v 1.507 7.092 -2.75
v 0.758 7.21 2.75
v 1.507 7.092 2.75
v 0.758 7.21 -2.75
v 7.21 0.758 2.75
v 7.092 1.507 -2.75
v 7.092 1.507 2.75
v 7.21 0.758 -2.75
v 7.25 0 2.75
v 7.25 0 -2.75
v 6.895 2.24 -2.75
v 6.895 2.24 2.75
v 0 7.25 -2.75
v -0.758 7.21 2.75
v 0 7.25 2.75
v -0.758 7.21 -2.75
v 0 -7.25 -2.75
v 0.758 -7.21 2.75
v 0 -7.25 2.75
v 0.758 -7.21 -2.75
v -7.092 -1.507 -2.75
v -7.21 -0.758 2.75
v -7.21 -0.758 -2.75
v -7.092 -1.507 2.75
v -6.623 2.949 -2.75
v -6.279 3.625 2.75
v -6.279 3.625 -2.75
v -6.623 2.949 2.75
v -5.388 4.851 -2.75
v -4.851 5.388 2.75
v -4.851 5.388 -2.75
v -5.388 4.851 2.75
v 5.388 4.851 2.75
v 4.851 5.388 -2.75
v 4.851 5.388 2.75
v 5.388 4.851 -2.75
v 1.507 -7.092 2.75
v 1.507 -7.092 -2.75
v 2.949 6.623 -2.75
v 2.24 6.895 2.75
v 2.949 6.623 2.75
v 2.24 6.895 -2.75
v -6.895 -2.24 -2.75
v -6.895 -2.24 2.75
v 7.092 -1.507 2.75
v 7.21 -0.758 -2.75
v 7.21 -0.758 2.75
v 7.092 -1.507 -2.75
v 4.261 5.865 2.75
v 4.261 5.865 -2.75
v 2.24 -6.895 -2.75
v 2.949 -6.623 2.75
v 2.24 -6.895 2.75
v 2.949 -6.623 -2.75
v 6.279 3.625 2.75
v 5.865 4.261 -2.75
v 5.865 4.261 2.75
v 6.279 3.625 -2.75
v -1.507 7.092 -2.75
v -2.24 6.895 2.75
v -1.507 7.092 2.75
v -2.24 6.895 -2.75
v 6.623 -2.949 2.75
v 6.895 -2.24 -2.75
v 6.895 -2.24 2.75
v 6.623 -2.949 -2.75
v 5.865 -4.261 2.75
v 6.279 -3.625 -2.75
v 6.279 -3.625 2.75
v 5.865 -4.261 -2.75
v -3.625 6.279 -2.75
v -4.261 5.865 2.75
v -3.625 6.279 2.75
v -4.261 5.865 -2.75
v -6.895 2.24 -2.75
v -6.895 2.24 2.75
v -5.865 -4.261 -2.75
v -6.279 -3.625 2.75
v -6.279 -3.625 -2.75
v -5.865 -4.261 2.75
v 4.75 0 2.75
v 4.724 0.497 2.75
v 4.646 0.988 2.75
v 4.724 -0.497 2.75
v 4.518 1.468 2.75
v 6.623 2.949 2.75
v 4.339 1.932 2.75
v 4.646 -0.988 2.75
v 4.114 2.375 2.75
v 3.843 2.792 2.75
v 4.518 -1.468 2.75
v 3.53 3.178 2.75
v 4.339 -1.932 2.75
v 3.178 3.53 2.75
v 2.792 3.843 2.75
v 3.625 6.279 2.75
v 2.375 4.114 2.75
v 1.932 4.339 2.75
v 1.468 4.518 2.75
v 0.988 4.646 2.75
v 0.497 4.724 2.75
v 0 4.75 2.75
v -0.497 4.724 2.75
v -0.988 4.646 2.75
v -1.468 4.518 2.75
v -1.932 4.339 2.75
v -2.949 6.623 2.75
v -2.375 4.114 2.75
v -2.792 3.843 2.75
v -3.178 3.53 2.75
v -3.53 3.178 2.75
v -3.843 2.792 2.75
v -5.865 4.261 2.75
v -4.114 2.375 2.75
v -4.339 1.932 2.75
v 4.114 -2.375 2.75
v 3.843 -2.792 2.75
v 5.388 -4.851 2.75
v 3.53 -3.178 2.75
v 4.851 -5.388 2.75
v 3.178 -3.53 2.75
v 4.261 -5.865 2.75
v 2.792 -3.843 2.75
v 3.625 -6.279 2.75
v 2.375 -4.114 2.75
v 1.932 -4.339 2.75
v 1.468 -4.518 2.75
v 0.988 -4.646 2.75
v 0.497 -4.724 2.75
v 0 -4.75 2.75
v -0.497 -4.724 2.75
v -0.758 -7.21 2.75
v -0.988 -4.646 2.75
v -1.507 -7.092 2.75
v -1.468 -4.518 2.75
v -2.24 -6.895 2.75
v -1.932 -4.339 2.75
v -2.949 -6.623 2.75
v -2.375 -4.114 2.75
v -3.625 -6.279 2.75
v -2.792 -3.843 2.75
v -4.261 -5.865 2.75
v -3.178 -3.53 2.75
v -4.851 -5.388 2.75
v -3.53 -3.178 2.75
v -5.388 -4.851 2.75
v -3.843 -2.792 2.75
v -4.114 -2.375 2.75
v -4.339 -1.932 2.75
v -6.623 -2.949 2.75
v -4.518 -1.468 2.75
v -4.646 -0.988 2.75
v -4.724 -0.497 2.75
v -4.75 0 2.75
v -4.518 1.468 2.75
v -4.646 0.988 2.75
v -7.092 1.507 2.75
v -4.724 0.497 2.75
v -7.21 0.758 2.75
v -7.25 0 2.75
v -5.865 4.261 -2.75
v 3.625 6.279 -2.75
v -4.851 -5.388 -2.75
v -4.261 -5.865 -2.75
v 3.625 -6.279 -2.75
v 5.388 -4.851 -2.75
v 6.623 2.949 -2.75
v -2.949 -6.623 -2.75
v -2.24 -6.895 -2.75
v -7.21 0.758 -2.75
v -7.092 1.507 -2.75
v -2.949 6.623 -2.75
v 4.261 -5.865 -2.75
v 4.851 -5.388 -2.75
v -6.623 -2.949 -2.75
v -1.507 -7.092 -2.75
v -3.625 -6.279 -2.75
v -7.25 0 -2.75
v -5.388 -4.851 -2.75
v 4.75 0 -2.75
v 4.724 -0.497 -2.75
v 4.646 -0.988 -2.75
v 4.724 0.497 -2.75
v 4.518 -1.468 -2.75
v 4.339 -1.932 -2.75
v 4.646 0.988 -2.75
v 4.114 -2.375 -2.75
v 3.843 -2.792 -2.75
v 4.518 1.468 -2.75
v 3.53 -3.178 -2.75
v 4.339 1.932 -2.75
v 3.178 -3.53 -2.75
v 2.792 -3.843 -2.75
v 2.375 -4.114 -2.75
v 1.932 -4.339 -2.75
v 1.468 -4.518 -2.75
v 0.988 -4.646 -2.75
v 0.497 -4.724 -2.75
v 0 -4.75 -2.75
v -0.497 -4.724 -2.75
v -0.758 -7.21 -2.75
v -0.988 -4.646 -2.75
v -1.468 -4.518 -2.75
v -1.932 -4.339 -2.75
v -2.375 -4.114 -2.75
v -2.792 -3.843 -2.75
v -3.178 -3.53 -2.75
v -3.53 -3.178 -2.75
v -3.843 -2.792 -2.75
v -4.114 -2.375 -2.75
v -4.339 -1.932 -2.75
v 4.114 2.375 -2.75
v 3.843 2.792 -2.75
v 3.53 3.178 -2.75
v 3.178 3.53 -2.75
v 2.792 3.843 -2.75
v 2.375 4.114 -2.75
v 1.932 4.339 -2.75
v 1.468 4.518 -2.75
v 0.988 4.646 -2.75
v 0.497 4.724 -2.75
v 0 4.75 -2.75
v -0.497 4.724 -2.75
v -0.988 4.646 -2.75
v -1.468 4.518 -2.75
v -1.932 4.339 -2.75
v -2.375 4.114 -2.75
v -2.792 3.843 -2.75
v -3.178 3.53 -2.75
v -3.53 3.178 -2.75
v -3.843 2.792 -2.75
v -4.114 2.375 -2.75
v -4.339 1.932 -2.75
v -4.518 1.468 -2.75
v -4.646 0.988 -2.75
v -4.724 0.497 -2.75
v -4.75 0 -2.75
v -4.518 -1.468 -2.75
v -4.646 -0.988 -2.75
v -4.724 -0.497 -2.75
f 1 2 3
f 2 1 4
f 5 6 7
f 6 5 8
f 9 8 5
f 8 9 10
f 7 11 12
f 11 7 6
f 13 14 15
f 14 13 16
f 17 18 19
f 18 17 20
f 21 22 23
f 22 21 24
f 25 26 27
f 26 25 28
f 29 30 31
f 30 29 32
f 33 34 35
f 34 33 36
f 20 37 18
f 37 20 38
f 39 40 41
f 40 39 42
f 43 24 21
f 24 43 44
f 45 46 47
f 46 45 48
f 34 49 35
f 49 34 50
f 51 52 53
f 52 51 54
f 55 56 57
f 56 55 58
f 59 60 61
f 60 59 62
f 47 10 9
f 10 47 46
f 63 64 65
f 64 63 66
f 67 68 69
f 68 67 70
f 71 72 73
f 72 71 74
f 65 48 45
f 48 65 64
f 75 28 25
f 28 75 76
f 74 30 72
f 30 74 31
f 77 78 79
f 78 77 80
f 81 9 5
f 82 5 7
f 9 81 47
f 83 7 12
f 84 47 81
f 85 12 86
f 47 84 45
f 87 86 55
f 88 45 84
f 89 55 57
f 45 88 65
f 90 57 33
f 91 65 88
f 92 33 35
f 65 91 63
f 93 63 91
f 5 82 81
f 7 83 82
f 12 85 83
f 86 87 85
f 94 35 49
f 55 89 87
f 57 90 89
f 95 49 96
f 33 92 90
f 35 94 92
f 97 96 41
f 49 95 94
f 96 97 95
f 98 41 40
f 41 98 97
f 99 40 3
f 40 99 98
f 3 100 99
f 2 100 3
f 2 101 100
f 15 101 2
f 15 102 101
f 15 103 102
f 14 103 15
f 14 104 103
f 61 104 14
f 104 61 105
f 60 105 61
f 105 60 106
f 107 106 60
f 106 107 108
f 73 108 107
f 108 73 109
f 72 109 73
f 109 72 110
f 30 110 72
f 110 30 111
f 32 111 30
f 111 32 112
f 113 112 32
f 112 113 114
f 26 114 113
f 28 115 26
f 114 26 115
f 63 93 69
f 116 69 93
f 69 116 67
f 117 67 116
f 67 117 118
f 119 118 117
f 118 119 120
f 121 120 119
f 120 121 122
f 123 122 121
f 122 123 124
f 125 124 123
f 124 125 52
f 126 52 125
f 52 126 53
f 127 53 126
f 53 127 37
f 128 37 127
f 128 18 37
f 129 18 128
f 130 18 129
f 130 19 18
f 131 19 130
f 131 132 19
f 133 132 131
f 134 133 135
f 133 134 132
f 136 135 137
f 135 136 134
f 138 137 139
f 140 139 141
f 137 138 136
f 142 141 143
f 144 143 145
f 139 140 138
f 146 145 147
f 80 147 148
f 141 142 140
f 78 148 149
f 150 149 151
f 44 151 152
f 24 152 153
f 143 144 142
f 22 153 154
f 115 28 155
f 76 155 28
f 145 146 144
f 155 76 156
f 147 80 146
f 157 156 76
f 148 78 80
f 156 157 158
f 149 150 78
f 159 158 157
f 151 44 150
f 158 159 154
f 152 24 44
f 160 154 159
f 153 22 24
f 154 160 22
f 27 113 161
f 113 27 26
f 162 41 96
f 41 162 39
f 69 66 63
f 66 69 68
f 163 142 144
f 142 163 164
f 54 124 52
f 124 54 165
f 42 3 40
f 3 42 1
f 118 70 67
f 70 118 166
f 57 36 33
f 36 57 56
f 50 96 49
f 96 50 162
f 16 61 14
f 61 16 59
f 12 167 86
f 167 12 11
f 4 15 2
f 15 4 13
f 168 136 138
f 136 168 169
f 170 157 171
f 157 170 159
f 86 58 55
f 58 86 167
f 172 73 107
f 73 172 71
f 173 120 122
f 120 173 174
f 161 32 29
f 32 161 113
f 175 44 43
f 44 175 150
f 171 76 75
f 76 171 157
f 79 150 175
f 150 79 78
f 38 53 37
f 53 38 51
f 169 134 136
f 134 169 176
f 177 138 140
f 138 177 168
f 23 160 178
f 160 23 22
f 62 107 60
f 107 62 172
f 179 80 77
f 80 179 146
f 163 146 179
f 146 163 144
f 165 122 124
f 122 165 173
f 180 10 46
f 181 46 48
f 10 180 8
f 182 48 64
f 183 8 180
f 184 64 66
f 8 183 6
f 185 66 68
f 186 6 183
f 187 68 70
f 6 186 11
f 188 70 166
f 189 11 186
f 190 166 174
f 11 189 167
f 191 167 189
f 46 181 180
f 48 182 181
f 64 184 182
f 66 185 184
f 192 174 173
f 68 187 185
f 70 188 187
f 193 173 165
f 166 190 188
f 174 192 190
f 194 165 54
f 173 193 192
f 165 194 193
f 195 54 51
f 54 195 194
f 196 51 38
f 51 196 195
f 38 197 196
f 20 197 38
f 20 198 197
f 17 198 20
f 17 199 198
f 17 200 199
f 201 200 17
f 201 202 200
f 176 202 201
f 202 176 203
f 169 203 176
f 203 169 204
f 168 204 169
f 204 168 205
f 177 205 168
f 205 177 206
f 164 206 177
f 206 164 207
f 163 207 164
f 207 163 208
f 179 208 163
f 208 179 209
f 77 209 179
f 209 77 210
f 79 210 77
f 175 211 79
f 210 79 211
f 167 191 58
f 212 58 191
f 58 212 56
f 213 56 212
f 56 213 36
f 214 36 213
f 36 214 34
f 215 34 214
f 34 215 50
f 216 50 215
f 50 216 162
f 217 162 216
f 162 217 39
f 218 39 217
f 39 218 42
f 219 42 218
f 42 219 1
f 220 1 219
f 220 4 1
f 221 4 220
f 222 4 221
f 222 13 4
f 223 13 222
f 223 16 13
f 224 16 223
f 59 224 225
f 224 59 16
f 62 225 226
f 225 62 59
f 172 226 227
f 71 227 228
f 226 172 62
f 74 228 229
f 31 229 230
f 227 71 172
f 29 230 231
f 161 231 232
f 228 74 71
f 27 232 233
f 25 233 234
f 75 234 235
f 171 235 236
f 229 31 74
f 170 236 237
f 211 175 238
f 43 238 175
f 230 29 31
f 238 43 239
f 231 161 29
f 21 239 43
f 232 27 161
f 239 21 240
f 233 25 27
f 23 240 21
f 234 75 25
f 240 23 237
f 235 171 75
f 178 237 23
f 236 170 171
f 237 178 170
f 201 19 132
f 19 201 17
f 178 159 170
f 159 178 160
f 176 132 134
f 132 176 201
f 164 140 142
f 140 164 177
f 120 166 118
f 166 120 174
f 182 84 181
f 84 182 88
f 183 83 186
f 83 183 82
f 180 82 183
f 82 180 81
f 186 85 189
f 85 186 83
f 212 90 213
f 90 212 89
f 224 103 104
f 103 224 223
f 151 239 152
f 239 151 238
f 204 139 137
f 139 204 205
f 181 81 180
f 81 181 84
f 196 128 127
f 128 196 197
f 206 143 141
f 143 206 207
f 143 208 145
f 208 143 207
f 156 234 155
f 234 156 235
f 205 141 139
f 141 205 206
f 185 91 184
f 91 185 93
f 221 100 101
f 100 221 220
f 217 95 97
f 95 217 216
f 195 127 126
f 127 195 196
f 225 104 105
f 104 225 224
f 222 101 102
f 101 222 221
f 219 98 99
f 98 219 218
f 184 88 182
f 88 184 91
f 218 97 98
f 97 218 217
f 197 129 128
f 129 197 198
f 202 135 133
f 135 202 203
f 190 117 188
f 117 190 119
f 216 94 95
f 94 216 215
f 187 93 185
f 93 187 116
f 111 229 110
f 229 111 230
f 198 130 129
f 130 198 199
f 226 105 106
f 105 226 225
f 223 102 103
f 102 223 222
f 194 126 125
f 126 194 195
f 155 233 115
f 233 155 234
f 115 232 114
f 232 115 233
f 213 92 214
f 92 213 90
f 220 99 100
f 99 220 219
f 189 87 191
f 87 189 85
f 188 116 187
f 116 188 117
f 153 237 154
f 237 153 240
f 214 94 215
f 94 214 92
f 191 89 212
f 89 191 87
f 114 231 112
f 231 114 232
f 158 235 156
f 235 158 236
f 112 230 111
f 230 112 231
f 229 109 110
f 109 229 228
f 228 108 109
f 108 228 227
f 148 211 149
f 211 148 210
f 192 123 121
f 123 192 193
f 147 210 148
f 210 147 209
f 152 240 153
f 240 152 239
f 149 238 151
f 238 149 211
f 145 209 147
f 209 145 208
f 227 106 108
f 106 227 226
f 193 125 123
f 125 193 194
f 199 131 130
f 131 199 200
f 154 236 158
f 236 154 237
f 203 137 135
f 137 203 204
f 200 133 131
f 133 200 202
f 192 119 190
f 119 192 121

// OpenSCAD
/*
 * spacerring.scad -- Spacer ring 
 *
 * (c) 2015 Prof Dr Andreas Mueller, Hochschule Rapperswil
 */
height = 5.5;
width = 2.5;
innerradius = 9.5 / 2;

difference() {
	cylinder(r = innerradius + 2.5, h = height, center = true, $fn = 60);
	cylinder(r = innerradius, h = height + 1, center = true, $fn = 60);
}
